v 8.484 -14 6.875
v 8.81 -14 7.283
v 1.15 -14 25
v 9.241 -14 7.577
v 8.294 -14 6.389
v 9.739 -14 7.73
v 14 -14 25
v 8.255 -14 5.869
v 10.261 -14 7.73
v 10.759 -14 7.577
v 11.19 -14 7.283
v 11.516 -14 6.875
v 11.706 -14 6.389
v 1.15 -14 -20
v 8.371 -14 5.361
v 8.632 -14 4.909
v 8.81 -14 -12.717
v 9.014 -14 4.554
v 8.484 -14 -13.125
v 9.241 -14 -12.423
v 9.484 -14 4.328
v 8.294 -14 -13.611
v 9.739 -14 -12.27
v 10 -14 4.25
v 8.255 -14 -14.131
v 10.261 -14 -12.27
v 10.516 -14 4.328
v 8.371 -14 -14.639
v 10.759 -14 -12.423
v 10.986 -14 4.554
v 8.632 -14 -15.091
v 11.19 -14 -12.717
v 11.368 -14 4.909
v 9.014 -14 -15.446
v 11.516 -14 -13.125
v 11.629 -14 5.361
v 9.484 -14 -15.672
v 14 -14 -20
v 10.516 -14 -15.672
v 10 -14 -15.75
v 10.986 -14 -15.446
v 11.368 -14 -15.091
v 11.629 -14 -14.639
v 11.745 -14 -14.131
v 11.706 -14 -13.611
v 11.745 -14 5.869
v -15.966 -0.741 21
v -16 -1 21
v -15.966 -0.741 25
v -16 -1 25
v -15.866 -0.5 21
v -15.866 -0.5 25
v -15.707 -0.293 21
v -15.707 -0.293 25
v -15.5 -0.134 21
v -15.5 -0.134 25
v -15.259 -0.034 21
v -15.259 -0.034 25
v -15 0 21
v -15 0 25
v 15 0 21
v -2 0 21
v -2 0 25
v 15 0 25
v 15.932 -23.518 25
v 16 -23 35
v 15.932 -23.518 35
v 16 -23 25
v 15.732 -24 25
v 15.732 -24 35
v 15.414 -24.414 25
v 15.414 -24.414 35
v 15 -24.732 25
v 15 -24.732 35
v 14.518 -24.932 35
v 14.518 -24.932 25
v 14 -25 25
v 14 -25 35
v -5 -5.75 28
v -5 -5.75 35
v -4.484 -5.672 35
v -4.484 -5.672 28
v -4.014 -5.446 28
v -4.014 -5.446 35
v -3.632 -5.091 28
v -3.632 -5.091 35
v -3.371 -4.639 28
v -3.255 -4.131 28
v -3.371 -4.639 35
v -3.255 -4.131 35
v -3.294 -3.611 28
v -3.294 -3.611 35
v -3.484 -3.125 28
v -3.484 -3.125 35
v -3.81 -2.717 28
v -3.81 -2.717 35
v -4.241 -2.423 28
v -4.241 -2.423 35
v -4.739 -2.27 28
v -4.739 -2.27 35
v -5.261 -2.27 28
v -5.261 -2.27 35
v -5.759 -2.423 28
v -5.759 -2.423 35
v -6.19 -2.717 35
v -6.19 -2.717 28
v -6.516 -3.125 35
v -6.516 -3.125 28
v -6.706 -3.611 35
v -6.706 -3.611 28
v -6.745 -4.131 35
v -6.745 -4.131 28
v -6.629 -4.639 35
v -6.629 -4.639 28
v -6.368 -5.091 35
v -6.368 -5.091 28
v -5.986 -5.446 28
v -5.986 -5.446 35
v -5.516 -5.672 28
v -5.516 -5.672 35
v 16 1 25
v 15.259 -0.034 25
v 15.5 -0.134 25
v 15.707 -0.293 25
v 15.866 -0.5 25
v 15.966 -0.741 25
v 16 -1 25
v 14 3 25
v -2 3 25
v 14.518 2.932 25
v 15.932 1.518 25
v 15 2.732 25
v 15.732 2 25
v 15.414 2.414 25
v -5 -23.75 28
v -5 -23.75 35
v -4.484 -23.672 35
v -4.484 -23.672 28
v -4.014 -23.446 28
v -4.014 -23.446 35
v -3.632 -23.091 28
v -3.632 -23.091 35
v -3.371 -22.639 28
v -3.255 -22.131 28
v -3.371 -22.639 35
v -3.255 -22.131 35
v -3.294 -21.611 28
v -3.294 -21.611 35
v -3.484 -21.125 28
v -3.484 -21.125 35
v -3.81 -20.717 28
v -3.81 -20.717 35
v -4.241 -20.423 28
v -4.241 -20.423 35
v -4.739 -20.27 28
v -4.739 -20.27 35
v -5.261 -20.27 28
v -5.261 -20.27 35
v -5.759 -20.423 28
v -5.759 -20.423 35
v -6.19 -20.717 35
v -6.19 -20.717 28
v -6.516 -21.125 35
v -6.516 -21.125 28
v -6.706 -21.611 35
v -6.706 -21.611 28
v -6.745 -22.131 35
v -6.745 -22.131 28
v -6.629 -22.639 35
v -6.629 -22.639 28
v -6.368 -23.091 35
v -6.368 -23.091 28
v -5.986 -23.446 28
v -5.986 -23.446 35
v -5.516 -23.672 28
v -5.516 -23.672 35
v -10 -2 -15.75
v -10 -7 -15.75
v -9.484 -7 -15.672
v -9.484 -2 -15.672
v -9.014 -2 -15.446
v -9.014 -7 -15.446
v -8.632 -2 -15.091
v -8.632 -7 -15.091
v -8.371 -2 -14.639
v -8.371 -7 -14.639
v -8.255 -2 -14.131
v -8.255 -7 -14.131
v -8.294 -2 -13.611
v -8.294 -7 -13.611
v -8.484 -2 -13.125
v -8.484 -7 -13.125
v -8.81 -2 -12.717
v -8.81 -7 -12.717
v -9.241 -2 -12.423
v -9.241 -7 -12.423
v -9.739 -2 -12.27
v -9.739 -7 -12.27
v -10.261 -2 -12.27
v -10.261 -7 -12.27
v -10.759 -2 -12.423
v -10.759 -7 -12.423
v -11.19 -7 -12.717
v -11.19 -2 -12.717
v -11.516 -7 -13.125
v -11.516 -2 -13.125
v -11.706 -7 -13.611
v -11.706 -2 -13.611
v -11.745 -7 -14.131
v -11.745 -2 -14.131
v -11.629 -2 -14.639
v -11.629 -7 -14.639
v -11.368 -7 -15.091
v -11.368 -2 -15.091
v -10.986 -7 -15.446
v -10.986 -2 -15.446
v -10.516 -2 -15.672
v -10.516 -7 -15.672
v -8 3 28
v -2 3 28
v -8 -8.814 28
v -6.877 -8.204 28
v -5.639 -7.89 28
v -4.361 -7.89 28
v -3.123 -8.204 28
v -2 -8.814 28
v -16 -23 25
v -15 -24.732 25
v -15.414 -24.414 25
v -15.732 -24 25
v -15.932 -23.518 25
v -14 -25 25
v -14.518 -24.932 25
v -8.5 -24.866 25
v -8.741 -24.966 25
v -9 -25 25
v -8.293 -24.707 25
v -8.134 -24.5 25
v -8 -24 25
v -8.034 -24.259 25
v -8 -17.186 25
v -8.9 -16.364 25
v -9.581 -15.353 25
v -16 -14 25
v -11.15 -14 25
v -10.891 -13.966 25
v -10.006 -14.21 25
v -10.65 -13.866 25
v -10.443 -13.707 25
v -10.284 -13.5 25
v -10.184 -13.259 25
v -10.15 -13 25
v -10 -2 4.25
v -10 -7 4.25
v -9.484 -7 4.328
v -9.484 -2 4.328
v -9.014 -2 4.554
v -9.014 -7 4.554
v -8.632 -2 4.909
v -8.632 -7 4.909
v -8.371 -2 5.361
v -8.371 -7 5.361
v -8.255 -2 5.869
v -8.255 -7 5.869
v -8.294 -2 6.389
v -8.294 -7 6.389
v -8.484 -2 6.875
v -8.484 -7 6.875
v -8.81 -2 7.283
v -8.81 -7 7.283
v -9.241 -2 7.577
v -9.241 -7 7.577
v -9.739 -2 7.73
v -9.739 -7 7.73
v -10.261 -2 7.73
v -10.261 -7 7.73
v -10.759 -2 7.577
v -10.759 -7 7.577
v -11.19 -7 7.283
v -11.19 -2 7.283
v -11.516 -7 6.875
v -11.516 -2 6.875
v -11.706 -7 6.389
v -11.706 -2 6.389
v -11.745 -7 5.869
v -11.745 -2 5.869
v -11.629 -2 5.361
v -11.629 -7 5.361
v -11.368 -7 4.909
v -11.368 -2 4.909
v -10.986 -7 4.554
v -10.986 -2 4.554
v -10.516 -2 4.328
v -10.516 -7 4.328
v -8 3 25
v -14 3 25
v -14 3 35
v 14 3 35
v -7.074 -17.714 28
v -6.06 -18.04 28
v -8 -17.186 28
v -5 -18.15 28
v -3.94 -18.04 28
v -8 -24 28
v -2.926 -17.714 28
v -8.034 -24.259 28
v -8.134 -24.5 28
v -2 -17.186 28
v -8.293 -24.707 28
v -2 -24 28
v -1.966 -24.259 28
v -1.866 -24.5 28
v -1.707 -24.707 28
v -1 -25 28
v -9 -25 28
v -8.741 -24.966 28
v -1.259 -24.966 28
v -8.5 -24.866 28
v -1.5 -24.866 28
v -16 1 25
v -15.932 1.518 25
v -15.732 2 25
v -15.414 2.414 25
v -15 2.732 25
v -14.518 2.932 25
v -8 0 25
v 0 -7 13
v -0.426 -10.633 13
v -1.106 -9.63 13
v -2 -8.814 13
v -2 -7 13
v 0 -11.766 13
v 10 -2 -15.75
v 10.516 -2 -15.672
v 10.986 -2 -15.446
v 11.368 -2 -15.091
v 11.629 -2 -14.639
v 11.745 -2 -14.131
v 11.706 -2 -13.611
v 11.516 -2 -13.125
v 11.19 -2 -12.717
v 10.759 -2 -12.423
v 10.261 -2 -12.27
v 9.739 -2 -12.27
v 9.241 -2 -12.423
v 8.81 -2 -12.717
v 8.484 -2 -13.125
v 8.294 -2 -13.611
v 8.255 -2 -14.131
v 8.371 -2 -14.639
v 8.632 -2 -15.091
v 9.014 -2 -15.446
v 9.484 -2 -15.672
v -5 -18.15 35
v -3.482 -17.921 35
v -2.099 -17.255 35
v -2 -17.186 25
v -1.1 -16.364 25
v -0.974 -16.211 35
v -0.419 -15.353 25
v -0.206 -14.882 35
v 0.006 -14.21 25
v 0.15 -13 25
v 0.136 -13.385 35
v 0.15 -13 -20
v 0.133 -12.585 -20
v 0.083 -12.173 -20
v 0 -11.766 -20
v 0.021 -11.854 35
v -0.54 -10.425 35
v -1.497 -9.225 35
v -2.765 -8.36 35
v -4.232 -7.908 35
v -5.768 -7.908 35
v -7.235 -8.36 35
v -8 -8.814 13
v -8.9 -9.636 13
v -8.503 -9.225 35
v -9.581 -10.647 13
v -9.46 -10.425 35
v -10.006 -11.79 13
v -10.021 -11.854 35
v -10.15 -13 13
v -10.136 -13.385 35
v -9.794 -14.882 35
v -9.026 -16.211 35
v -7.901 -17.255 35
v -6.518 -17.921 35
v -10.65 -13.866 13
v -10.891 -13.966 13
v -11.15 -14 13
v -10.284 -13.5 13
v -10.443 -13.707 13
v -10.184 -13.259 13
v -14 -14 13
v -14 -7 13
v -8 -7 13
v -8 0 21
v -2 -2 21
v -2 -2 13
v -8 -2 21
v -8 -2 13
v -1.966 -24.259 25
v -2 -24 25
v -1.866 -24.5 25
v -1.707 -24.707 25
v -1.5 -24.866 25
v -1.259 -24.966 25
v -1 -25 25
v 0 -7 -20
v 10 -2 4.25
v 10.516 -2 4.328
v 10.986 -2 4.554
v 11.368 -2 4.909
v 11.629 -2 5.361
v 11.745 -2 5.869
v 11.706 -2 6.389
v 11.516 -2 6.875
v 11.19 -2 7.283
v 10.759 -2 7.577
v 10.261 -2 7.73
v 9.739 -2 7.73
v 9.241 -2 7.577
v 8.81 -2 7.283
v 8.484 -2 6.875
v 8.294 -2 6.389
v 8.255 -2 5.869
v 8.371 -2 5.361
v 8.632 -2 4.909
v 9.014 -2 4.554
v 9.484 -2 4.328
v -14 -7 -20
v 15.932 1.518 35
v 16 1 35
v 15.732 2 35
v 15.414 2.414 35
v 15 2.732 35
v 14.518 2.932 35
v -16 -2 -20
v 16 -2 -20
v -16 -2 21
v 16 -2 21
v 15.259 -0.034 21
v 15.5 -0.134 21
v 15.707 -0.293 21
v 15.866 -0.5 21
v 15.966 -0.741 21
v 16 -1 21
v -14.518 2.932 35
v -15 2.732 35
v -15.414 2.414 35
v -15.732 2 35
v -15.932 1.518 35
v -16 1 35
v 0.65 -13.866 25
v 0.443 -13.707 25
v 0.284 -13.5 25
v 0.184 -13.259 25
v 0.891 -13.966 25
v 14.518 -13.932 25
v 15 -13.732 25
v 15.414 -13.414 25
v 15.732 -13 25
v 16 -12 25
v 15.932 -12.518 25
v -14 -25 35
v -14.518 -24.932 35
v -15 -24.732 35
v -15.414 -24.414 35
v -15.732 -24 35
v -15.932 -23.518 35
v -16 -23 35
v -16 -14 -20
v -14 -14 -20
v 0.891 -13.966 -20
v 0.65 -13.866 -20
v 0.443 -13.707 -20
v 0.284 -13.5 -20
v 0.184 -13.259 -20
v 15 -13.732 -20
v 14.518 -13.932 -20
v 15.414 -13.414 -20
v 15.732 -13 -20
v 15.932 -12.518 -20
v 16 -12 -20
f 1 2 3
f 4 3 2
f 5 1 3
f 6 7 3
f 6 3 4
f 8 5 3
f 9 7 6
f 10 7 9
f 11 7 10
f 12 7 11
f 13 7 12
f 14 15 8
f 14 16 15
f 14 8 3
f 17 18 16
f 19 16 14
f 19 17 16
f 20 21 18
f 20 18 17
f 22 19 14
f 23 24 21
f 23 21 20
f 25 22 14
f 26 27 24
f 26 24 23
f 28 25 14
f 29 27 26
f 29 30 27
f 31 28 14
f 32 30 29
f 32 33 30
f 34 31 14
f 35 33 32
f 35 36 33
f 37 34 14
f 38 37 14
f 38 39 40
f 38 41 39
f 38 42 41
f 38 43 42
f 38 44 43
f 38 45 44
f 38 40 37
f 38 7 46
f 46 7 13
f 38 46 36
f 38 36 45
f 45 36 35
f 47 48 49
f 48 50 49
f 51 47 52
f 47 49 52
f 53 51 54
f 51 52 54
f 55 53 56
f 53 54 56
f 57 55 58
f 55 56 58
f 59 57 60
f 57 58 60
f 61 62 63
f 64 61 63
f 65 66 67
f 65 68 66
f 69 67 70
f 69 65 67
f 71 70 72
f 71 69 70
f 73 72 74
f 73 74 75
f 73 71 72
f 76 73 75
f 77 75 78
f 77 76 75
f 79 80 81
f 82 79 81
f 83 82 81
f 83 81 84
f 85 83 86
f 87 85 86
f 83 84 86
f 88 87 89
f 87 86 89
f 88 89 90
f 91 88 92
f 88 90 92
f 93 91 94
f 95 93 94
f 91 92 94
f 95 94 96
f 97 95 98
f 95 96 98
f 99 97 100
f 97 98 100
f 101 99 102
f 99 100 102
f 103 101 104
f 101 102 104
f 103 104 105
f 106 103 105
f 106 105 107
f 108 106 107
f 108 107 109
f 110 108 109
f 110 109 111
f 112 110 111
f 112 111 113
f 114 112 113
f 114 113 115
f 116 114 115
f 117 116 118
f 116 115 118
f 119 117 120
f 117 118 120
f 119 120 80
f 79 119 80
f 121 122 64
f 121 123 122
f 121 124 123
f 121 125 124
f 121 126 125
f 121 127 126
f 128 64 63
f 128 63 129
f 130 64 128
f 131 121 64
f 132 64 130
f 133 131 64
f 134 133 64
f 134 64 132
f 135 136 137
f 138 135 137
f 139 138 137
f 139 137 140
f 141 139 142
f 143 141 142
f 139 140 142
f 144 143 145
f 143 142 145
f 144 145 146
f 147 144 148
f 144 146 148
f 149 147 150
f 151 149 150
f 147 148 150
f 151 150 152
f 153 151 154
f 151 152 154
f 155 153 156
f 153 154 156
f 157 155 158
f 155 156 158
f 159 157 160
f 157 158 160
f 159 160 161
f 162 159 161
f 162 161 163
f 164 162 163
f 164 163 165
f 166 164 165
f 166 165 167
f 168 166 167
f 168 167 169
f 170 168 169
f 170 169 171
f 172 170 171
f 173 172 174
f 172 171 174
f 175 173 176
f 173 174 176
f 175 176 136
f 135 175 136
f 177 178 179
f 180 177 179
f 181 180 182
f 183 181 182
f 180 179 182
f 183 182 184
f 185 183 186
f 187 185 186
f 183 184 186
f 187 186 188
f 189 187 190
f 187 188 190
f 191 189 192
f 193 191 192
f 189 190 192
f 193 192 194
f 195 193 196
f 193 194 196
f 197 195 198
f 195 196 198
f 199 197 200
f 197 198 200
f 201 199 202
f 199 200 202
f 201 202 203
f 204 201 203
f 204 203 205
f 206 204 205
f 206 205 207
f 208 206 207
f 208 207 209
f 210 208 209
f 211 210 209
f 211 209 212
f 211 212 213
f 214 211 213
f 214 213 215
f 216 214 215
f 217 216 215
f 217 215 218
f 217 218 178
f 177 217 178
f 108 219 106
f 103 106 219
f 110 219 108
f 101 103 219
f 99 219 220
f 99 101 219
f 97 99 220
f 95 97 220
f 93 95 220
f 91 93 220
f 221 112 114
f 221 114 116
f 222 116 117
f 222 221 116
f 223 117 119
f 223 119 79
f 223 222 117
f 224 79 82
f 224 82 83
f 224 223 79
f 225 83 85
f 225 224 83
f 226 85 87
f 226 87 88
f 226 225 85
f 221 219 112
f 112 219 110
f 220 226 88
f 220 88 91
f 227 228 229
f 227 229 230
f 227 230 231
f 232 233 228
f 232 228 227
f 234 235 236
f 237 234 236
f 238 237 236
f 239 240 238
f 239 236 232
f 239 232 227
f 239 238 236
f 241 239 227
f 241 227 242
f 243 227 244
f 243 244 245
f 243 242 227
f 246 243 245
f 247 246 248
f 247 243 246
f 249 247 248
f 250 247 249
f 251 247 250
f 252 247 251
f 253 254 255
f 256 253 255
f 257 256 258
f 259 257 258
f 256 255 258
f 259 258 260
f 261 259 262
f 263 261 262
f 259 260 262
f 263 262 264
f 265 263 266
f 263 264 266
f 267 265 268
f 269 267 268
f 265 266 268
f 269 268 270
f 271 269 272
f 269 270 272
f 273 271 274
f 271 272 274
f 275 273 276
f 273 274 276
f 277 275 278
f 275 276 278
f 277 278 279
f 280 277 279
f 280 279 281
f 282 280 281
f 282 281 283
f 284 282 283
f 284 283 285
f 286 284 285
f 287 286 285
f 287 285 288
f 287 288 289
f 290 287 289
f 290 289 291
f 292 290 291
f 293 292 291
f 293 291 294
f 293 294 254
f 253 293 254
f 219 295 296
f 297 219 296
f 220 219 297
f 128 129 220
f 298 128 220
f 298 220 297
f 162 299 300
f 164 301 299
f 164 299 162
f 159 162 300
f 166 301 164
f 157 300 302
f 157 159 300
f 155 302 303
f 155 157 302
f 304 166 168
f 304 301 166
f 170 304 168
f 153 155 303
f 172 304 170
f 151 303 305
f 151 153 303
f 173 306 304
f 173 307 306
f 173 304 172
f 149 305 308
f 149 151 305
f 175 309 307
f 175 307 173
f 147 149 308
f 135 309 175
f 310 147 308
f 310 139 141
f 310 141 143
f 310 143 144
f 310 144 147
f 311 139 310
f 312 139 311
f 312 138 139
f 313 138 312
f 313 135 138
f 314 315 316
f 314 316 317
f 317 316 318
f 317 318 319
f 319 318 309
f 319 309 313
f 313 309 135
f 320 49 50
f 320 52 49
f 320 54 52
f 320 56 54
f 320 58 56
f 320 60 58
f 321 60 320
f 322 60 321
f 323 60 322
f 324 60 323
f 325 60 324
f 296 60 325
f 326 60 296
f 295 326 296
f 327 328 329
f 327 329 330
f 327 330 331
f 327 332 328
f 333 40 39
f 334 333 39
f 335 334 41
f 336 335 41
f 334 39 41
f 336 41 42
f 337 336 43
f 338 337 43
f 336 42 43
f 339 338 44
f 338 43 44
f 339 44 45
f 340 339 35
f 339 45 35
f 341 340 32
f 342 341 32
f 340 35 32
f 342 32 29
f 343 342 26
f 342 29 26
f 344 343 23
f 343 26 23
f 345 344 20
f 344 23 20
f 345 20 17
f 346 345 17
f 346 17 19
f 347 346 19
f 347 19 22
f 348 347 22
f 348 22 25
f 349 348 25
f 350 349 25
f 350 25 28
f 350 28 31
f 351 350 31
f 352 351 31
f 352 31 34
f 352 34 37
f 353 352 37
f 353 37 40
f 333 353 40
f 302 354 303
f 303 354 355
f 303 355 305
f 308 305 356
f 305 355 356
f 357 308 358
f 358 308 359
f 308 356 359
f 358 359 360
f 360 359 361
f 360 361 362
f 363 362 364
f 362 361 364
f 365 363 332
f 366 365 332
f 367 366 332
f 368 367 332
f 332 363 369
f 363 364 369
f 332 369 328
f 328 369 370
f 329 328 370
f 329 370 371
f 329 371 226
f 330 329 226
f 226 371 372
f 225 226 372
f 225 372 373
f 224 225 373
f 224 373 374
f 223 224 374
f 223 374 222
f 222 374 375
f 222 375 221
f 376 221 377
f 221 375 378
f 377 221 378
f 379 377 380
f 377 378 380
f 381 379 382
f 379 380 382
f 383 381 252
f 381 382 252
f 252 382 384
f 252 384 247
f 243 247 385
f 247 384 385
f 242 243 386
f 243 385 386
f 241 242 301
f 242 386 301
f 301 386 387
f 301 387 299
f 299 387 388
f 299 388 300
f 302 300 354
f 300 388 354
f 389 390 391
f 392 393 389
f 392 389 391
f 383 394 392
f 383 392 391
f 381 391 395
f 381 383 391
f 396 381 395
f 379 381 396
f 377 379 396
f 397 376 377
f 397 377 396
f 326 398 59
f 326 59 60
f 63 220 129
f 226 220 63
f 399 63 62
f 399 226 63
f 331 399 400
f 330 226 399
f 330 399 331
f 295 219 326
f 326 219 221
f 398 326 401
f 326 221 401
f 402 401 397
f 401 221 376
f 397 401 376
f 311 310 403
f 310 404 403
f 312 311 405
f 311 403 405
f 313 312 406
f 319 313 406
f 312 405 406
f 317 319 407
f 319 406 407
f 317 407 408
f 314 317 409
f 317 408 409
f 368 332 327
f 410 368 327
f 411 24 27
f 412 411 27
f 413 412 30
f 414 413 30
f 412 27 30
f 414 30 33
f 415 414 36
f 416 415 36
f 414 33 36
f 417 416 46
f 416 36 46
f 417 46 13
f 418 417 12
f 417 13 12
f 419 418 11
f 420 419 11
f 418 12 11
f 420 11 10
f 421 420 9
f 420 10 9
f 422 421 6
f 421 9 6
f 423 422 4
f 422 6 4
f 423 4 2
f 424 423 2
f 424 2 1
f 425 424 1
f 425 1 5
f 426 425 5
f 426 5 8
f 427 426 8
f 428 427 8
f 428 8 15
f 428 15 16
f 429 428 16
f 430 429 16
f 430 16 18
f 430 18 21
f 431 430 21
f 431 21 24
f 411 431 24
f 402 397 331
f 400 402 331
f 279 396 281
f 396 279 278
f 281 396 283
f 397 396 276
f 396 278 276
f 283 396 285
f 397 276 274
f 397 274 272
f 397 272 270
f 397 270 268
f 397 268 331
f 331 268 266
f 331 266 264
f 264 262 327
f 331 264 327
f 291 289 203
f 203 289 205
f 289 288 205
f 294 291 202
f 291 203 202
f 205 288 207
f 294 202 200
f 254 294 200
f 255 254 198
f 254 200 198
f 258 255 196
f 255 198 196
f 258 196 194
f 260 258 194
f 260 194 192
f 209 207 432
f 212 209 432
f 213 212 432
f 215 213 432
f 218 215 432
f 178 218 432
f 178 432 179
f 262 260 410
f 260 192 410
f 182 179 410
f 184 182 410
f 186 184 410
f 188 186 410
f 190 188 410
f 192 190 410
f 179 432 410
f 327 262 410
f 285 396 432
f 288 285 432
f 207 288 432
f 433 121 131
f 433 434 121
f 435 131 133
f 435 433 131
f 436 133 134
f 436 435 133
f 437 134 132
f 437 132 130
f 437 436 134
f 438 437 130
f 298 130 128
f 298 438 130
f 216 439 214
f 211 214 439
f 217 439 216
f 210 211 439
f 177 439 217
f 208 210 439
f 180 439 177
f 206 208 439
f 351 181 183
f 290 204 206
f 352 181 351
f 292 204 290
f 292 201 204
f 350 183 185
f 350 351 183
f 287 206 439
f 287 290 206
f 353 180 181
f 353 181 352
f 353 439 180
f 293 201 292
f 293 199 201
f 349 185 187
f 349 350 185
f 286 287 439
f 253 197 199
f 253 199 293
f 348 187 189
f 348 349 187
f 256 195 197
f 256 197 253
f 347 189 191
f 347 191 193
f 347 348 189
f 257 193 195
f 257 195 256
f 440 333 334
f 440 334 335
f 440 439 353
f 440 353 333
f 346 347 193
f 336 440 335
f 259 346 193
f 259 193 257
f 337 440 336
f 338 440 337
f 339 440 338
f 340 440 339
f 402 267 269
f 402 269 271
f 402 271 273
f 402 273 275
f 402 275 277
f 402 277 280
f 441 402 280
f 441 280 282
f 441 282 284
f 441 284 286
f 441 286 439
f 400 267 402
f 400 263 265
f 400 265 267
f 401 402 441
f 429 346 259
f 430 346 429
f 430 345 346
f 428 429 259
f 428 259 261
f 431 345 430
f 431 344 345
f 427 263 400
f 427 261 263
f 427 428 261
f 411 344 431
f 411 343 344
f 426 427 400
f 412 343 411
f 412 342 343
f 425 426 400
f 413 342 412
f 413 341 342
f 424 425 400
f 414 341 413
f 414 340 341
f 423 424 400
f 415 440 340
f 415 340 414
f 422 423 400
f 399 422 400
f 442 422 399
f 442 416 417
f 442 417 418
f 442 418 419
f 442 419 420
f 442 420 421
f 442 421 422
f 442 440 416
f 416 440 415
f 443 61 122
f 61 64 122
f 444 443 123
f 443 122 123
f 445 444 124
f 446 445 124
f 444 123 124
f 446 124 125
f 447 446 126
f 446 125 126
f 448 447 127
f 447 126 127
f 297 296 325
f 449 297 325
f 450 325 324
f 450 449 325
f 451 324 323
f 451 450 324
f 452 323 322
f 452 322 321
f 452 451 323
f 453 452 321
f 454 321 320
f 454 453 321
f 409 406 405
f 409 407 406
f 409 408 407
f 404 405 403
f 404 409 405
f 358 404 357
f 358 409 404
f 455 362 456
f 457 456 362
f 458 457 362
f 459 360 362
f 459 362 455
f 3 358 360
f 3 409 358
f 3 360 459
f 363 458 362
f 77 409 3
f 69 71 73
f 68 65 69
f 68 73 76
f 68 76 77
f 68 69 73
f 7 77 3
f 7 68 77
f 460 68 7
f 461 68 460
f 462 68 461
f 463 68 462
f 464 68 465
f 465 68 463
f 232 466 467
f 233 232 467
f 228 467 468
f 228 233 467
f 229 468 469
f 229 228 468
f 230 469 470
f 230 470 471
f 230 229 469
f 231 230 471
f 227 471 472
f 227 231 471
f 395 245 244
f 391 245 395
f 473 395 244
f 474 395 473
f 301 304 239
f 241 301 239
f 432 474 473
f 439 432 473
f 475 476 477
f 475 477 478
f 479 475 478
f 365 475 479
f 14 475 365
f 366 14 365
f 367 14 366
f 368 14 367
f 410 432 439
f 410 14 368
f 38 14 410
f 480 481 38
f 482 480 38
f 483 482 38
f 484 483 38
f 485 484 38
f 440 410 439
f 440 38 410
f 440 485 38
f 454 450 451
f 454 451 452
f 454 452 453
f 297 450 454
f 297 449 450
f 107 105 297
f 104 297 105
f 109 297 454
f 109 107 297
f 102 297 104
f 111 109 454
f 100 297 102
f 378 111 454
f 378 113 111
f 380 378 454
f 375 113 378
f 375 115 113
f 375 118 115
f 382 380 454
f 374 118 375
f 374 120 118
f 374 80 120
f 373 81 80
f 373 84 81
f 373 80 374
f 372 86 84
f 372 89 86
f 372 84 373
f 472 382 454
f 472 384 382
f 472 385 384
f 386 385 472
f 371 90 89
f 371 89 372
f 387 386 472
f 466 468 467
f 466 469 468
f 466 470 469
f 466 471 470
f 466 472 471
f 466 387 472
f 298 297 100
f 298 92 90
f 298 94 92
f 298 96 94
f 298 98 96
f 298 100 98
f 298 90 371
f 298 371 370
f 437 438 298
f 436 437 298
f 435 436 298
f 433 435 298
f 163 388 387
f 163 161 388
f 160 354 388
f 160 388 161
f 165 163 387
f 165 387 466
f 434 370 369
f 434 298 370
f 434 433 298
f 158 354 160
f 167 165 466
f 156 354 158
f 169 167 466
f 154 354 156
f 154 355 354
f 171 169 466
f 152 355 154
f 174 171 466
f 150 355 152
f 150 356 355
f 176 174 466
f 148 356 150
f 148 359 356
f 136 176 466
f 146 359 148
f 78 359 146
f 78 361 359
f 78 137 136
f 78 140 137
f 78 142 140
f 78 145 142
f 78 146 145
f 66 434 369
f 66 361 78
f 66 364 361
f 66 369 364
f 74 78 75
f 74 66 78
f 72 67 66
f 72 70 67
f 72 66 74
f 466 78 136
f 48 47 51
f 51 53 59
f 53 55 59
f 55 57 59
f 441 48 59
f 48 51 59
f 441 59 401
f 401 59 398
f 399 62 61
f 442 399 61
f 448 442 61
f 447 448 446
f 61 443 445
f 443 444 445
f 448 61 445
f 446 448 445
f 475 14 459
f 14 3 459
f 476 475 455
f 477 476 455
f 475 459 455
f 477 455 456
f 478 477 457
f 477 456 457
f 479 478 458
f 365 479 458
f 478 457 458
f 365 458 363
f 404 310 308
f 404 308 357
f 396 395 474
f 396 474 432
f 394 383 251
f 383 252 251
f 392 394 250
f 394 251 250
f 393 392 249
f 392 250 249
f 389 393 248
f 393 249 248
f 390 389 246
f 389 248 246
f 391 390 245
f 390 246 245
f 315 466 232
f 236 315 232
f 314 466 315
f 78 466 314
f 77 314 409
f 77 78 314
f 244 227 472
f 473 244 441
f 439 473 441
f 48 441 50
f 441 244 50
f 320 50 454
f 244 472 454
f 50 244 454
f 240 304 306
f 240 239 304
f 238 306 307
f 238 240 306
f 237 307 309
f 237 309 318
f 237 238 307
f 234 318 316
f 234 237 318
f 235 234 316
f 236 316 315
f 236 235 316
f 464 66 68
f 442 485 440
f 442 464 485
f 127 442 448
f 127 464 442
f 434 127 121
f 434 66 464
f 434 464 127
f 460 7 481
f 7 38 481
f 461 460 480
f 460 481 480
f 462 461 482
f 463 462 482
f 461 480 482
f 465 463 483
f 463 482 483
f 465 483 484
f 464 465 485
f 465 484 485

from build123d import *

# Parameters (mm, degrees)
PAD001_DEPTH      = 16
PAD001_DEPTH_BACK = 16
SKETCH014_W       = 15
SKETCH014_H       = 6
POCKET_DEPTH      = 28.001
SKETCH012_R       = 5.15
POCKET001_DEPTH   = 55.001
SKETCH013_R       = 1.75
POCKET002_DEPTH   = 7
SKETCH008_W       = 7.907674
SKETCH008_H       = 14
POCKET003_DEPTH   = 33
SKETCH007_R       = 1.75
POCKET004_DEPTH   = 17.001
SKETCH015_W       = 50.47
SKETCH015_H       = 40
POCKET005_DEPTH   = 2
FILLET_R          = 2
FILLET001_R       = 1
FILLET002_R       = 1
FILLET003_R       = 1
FILLET004_R       = 2


with BuildPart() as part:
    # Sketch005 → Pad001 (new body, two sides)
    with BuildSketch(Plane.YZ) as pad001_sk:
        Polygon((0, -20), (0, 25), (3, 25), (3, 35), (-25, 35), (-25, 25), (-14, 25), (-14, -20), align=None)
    extrude(amount=PAD001_DEPTH)
    extrude(pad001_sk.sketch, amount=-PAD001_DEPTH_BACK)

    # Sketch014 (on Face5 of Pad001) → Pocket (cut, through all)
    with BuildSketch(Plane(origin=(0, -25, 0), x_dir=(0, 0, -1), z_dir=(0, -1, 0))):
        with Locations((-20.5, -5)):
            Rectangle(SKETCH014_W, SKETCH014_H)
    extrude(amount=-POCKET_DEPTH, mode=Mode.SUBTRACT)

    # Sketch012 → Pocket001 (cut, through all)
    with BuildSketch(Plane(origin=(0, 0, 35), x_dir=(0, -1, 0), z_dir=(0, 0, 1))):
        with Locations((13, -5)):
            Circle(SKETCH012_R)
    extrude(amount=-POCKET001_DEPTH, mode=Mode.SUBTRACT)

    # Sketch013 → Pocket002 (cut)
    with BuildSketch(Plane(origin=(0, 0, 35), x_dir=(0, -1, 0), z_dir=(0, 0, 1))):
        with Locations((4, -5)):
            Circle(SKETCH013_R)
        with Locations((22, -5)):
            Circle(SKETCH013_R)
    extrude(amount=-POCKET002_DEPTH, mode=Mode.SUBTRACT)

    # Sketch008 (on Face9 of Pocket002) → Pocket003 (cut)
    with BuildSketch(Plane.YX.offset(20)):
        with Locations((-10.953837, -7)):
            Rectangle(SKETCH008_W, SKETCH008_H)
    extrude(amount=-POCKET003_DEPTH, mode=Mode.SUBTRACT)

    # Sketch007 (on Face21 of Pocket003) → Pocket004 (cut, through all)
    with BuildSketch(Plane(origin=(0, -14, 0), x_dir=(0, 0, -1), z_dir=(0, -1, 0))):
        with Locations((-6, 10)):
            Circle(SKETCH007_R)
        with Locations((14, 10)):
            Circle(SKETCH007_R)
        with Locations((-6, -10)):
            Circle(SKETCH007_R)
        with Locations((14, -10)):
            Circle(SKETCH007_R)
    extrude(amount=-POCKET004_DEPTH, mode=Mode.SUBTRACT)

    # Sketch015 (on Face1 of Pocket004) → Pocket005 (cut)
    with BuildSketch(Plane.ZX):
        with Locations((-4.235, 0)):
            Rectangle(SKETCH015_W, SKETCH015_H)
    extrude(amount=-POCKET005_DEPTH, mode=Mode.SUBTRACT)

    # Fillet
    fillet_edges = [part.edges().sort_by_distance(p)[0] for p in [
        (16, 3, 30),
        (-16, 3, 30),
        (-16, -25, 30),
        (16, -25, 30),
    ]]
    fillet(fillet_edges, radius=FILLET_R)

    # Fillet001
    fillet001_edges = [part.edges().sort_by_distance(p)[0] for p in [
        (0.05198, -14, 2.5),
        (-10.05198, -14, 19),
    ]]
    fillet(fillet001_edges, radius=FILLET001_R)

    # Fillet002
    fillet002_edges = [part.edges().sort_by_distance(p)[0] for p in [
        (-2, -25, 26.5),
        (-8, -25, 26.5),
    ]]
    fillet(fillet002_edges, radius=FILLET002_R)

    # Fillet003
    fillet003_edges = [part.edges().sort_by_distance(p)[0] for p in [
        (-16, 0, 23),
        (16, 0, 23),
    ]]
    fillet(fillet003_edges, radius=FILLET003_R)

    # Fillet004
    fillet004_edges = [part.edges().sort_by_distance(p)[0] for p in [
        (16, -14, 2.5),
    ]]
    fillet(fillet004_edges, radius=FILLET004_R)


solid = part.part
